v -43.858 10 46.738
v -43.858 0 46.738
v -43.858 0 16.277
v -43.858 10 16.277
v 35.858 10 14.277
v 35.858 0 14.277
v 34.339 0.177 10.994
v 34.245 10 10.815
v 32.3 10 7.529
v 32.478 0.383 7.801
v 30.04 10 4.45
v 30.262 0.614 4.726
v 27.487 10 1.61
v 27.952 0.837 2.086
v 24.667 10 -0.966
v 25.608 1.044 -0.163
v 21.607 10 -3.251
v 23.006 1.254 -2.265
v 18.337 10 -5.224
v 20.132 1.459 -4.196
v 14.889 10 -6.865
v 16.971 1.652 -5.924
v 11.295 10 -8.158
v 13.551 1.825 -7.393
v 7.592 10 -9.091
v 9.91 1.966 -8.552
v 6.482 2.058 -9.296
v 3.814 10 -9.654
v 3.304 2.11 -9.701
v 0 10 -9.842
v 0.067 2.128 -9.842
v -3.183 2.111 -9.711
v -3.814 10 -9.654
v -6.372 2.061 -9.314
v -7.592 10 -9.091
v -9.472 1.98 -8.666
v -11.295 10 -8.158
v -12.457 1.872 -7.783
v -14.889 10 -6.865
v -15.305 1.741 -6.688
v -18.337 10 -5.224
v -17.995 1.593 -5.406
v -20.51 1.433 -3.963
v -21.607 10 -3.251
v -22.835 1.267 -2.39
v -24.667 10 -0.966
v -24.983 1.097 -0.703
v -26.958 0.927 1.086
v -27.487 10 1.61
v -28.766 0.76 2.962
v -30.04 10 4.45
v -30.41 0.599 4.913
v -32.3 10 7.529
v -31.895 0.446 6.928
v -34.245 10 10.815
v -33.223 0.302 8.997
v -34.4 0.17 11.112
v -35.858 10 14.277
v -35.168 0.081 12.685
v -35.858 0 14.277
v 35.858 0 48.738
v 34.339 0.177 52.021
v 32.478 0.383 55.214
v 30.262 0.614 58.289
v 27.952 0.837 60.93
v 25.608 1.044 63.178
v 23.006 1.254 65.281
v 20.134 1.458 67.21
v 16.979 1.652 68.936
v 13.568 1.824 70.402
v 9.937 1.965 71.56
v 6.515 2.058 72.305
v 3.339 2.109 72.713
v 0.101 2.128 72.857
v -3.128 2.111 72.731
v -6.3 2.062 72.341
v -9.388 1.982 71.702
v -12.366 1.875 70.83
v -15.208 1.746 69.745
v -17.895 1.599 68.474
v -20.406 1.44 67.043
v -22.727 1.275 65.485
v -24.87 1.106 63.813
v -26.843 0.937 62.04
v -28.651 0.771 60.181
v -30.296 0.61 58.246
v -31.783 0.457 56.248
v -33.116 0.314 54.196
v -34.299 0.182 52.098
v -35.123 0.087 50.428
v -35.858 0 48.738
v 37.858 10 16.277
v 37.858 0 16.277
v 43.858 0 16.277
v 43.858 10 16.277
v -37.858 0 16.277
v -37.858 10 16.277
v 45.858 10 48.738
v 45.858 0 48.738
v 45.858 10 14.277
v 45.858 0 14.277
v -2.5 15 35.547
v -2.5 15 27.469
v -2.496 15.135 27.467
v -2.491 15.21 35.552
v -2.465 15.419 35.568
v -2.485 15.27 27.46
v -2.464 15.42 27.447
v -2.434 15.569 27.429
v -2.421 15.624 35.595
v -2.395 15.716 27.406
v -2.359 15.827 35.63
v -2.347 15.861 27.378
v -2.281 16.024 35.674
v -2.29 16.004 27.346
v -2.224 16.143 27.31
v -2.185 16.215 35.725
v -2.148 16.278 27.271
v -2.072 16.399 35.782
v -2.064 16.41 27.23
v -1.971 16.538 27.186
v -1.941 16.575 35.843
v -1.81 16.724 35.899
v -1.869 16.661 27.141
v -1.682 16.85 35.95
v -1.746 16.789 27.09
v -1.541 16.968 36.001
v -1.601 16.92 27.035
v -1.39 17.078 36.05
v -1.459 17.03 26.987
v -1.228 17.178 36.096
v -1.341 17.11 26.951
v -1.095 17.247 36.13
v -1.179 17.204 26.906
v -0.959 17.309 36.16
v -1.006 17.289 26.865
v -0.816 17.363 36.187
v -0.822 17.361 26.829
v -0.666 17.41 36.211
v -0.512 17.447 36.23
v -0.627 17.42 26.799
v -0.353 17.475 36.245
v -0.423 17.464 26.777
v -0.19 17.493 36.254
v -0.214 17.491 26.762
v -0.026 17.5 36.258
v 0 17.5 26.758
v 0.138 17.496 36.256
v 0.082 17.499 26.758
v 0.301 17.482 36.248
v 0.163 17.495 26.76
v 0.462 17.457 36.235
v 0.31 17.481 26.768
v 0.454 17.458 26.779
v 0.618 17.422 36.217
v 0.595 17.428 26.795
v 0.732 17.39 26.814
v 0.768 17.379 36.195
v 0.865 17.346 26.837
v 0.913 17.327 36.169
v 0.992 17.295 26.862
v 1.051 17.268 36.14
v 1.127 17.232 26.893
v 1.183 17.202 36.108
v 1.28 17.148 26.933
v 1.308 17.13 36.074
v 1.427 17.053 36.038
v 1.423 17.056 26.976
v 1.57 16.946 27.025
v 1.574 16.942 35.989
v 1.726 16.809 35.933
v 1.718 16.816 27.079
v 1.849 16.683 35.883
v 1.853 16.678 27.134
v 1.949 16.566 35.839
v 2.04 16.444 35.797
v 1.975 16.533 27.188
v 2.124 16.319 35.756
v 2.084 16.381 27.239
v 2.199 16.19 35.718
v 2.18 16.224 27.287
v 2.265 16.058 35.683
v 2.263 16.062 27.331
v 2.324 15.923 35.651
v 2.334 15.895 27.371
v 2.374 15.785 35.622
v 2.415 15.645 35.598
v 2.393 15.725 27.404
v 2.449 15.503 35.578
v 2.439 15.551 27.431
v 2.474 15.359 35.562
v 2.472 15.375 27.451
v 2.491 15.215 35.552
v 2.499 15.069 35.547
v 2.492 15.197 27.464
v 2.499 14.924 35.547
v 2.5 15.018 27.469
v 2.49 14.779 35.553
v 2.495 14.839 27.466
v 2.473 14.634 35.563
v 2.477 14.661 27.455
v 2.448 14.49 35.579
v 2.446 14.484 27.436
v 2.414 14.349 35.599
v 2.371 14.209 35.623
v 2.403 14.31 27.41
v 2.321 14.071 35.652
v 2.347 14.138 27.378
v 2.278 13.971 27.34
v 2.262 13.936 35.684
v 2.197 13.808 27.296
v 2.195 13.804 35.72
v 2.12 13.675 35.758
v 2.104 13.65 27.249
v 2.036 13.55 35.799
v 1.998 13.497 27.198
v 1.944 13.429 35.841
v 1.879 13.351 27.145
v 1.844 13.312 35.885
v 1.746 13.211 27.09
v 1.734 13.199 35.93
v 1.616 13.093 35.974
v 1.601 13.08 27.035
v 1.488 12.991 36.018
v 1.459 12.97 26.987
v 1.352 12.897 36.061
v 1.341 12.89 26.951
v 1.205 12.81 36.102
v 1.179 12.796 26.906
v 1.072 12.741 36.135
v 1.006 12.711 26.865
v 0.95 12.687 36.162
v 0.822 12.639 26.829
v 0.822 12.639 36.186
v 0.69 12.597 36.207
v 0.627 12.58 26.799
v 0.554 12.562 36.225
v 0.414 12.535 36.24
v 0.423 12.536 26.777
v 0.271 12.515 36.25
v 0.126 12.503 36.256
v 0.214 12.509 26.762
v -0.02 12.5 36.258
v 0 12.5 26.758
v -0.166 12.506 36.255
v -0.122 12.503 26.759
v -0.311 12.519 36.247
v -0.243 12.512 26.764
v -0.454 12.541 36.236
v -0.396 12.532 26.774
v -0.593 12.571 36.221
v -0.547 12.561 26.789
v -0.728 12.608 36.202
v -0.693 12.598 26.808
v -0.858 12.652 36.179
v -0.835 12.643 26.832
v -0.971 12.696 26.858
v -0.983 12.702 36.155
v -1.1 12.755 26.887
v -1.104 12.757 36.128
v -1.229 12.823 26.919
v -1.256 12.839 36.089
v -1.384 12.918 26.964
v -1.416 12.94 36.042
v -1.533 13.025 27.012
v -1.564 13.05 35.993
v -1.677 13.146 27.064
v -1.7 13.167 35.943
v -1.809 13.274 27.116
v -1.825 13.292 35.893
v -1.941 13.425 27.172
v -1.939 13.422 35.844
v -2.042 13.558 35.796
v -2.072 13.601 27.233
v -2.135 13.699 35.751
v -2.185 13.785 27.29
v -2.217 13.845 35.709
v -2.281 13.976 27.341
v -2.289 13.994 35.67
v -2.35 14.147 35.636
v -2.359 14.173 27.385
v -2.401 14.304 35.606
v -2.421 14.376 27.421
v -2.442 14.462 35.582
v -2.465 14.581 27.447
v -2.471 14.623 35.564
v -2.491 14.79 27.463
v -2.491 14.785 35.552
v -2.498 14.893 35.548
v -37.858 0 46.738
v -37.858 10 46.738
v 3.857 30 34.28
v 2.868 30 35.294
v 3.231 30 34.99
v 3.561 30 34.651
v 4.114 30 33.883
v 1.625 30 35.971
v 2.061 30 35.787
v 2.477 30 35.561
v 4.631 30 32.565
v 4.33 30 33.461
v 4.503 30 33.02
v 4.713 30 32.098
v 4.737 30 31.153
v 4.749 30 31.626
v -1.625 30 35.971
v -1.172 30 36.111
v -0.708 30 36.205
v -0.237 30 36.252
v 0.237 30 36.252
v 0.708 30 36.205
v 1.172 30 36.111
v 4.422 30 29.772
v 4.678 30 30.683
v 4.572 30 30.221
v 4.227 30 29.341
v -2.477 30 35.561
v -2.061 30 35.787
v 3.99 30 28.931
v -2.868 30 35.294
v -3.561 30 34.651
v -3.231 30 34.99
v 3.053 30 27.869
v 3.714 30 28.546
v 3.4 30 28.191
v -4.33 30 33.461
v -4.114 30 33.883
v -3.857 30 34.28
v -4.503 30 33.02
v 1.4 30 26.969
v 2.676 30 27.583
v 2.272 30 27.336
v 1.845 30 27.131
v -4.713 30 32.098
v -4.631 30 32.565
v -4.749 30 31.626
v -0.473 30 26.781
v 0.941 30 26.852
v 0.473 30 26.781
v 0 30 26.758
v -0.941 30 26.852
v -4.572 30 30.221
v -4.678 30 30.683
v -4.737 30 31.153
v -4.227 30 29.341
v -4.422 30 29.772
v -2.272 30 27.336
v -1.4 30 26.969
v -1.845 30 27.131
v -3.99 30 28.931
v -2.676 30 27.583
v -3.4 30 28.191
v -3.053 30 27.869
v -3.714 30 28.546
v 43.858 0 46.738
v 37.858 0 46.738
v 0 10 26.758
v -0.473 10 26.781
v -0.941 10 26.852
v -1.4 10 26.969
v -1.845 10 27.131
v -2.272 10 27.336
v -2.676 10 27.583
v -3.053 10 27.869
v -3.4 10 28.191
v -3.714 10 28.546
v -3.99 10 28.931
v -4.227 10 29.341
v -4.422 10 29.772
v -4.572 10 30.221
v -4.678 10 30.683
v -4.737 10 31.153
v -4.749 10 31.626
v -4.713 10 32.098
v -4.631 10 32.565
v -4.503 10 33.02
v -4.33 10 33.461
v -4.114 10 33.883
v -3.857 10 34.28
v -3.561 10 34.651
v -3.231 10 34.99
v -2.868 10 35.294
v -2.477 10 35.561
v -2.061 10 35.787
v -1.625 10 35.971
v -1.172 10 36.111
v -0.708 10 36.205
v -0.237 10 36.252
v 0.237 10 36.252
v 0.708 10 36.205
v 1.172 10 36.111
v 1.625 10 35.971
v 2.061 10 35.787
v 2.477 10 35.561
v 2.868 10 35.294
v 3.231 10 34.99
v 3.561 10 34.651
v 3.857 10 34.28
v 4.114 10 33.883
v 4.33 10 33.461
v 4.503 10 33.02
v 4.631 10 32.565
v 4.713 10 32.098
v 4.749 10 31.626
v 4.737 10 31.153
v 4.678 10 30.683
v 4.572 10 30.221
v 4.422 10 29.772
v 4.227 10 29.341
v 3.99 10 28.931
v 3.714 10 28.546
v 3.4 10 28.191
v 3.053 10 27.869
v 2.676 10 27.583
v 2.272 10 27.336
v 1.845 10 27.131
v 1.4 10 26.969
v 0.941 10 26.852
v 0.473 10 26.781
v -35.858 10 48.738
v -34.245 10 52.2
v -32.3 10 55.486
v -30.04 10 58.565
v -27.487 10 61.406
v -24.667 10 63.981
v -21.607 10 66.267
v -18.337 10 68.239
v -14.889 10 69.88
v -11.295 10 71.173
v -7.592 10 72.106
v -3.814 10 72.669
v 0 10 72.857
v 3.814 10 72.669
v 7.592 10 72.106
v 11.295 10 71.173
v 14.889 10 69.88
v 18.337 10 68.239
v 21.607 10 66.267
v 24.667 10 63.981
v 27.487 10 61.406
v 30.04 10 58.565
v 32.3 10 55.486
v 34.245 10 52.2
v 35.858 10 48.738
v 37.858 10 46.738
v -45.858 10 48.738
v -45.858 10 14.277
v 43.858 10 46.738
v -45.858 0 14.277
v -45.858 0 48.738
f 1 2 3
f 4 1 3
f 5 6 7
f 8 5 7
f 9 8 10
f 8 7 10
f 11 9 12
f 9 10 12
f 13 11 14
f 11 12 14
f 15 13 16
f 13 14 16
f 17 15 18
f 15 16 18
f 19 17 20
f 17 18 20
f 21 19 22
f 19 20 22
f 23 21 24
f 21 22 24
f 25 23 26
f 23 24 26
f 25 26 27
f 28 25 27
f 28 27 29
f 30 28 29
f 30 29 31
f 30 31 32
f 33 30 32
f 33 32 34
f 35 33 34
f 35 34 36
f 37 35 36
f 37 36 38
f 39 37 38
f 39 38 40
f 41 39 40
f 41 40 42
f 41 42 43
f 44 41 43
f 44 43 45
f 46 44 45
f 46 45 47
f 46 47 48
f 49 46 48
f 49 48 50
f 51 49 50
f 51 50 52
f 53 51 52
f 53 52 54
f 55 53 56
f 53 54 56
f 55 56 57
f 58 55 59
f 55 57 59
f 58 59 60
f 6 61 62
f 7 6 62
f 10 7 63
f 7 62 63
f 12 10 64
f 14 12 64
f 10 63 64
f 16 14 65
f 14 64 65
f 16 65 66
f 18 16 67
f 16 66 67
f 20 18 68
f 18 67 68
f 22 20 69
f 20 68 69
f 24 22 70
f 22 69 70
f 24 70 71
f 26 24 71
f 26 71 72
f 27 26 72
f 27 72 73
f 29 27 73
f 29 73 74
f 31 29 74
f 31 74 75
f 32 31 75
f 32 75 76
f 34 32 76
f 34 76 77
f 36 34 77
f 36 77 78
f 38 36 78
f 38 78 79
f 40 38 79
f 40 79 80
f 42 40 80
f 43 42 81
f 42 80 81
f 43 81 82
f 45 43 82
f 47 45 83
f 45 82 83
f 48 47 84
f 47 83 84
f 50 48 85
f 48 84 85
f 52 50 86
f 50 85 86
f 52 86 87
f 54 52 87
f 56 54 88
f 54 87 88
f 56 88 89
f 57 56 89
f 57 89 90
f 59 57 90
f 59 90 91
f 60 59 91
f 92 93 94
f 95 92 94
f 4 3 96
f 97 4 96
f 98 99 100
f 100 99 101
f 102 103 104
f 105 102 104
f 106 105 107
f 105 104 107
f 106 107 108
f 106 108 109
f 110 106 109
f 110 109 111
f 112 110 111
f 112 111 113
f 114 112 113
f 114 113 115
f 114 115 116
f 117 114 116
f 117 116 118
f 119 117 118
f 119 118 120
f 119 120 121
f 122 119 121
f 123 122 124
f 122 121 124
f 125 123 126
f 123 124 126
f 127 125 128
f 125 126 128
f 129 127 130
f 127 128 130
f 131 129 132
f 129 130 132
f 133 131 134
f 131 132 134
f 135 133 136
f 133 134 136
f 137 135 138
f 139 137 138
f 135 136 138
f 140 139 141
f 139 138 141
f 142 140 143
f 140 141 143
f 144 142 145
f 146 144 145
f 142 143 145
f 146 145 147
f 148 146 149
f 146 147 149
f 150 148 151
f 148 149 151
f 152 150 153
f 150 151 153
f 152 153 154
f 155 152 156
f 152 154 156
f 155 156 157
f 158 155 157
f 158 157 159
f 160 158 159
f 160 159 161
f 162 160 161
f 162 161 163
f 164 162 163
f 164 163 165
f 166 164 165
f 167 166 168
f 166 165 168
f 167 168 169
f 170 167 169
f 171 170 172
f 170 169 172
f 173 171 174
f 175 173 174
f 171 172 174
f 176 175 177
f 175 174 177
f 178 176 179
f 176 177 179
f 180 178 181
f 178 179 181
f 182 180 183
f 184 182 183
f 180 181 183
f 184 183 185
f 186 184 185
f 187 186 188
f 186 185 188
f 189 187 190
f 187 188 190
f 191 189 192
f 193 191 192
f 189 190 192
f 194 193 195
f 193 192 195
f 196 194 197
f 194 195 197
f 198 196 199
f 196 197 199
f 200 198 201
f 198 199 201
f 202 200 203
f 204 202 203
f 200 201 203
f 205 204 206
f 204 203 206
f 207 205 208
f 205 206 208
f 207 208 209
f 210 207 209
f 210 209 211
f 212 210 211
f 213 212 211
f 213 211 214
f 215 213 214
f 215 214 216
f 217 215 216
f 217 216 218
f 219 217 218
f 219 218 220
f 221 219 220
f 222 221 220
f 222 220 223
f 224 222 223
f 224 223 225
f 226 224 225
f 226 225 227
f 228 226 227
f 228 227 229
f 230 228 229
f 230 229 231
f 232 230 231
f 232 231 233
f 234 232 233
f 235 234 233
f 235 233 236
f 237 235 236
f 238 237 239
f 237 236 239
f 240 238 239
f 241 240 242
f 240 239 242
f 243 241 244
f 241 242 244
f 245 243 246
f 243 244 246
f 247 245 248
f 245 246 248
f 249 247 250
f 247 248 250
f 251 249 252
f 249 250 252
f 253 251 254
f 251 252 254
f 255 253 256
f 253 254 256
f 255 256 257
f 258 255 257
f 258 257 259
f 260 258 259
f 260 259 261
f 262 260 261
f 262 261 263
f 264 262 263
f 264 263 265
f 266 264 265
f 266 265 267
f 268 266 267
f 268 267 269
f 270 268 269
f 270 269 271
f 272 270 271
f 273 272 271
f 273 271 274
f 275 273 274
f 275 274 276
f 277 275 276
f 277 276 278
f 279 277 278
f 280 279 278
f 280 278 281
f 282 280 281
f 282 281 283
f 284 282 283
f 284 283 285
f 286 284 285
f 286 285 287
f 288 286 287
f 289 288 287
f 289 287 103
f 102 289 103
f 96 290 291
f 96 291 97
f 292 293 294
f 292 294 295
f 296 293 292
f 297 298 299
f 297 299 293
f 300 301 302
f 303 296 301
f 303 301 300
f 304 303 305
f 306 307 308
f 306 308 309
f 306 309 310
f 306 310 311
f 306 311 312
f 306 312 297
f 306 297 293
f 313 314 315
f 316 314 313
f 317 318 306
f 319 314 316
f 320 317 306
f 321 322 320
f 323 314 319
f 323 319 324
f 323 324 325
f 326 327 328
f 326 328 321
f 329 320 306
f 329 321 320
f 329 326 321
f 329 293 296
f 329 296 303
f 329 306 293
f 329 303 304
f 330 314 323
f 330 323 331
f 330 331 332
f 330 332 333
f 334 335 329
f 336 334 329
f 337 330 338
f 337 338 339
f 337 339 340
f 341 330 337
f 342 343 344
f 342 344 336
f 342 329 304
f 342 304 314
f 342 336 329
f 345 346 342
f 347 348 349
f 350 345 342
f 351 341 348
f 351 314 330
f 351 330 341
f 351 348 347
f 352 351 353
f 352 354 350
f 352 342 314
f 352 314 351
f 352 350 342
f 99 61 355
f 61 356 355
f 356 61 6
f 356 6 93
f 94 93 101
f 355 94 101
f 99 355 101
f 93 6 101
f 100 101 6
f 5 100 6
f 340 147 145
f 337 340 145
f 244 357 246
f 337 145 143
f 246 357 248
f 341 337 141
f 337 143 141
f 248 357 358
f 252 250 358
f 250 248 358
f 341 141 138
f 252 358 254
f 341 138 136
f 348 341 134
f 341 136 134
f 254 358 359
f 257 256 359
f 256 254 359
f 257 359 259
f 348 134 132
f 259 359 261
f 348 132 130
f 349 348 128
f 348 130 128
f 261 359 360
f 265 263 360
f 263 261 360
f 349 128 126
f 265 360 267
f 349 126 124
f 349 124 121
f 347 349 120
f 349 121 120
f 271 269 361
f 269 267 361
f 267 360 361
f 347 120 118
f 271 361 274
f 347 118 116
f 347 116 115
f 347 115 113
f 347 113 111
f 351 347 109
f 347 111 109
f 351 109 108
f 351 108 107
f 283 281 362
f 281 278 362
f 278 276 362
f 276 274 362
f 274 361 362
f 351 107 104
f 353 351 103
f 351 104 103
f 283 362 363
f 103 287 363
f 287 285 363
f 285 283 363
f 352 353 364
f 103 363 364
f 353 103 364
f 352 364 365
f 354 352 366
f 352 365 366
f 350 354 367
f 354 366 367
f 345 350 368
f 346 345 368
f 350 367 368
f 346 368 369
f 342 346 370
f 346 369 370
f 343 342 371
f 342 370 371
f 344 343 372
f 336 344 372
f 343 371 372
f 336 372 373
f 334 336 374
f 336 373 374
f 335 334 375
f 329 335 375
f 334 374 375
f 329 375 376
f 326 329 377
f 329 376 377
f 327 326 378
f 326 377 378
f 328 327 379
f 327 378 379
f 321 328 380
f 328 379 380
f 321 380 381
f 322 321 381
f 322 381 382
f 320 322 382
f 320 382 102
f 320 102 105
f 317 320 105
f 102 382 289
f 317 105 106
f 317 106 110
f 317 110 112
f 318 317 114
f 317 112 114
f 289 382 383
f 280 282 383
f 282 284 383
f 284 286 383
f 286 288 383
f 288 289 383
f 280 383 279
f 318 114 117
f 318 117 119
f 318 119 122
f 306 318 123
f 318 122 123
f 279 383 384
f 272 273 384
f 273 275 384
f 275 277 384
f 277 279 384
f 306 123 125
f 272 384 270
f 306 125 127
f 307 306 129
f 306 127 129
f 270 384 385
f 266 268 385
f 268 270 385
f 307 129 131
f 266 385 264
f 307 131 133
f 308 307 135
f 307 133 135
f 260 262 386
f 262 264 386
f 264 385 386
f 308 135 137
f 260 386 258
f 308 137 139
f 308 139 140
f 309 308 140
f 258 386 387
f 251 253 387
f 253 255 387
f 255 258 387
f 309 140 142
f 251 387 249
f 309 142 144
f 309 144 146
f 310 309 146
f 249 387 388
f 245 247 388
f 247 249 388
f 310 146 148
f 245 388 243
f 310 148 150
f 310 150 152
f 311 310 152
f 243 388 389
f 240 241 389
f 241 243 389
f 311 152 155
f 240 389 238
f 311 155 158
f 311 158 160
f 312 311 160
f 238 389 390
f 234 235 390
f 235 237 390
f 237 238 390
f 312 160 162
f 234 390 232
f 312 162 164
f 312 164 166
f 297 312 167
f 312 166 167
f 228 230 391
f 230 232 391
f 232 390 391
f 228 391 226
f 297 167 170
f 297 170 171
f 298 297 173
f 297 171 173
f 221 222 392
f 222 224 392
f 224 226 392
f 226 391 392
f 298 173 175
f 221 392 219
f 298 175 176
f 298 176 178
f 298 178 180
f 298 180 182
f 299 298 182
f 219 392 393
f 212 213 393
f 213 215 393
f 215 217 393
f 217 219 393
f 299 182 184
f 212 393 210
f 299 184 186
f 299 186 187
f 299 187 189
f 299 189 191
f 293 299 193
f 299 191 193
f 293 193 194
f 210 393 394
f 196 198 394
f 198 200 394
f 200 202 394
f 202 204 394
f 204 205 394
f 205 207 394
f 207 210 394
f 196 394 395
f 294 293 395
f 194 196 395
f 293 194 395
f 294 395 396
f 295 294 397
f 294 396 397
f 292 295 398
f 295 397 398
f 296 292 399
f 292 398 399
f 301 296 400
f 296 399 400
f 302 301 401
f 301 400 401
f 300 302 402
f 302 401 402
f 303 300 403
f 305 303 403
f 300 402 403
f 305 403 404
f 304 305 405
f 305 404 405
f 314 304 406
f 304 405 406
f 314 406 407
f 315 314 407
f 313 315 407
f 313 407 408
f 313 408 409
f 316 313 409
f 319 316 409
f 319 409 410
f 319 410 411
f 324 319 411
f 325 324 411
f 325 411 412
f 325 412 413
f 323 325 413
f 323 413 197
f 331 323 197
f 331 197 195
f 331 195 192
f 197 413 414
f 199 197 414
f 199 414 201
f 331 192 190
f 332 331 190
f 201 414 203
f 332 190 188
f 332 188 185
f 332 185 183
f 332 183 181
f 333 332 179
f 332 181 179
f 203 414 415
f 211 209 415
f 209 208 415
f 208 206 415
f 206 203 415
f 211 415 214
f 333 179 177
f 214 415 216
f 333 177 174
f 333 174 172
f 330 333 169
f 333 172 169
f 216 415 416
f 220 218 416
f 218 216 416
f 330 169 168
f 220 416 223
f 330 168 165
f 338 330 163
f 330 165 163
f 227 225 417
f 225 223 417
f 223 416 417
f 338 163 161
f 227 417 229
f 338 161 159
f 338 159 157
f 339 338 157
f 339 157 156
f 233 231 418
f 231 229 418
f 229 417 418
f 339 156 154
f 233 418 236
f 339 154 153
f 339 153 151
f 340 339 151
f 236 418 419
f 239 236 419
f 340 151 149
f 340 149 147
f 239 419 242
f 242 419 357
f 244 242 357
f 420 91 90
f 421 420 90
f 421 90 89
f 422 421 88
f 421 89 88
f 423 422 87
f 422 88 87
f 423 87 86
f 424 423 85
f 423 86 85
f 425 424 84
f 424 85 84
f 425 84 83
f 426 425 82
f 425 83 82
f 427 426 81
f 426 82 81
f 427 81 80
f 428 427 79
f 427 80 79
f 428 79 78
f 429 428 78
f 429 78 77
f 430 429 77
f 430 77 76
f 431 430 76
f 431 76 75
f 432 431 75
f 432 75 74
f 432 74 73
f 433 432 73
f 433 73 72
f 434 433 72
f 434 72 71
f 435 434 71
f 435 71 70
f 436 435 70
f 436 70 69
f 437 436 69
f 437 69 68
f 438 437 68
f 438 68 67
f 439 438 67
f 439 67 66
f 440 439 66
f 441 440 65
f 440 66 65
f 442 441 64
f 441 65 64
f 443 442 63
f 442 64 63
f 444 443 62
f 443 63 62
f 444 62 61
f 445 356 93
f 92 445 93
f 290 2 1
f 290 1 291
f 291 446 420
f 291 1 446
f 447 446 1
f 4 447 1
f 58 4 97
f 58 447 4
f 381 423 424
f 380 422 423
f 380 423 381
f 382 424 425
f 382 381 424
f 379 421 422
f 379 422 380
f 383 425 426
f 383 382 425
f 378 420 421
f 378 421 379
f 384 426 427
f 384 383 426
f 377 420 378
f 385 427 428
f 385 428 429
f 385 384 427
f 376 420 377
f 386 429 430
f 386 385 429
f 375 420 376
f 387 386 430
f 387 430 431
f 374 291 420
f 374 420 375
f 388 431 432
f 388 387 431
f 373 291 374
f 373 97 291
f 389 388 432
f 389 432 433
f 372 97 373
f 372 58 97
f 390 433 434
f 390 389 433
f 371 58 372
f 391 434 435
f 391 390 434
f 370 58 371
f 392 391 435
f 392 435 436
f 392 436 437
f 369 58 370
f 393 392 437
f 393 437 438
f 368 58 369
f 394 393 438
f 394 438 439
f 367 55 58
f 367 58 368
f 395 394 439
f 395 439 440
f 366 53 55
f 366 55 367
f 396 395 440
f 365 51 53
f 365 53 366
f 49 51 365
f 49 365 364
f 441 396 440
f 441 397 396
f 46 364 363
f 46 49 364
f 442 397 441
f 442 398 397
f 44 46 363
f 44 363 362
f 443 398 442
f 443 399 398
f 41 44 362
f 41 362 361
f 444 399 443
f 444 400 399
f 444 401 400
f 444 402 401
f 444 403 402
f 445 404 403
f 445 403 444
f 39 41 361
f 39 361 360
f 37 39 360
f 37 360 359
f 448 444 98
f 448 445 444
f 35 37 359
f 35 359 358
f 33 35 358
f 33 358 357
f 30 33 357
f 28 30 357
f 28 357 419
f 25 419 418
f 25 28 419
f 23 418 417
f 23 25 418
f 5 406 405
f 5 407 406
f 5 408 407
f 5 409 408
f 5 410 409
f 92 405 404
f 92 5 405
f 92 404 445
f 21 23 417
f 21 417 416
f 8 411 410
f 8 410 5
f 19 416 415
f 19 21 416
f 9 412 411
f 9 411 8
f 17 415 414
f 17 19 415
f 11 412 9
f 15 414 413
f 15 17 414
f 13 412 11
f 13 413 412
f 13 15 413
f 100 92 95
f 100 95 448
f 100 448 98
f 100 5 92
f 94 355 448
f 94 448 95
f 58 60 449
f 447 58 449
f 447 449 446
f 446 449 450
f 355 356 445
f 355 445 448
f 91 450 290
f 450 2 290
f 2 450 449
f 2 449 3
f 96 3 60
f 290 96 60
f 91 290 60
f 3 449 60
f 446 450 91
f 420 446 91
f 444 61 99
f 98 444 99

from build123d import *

# Parameters (mm, degrees)
SKETCH4_W           = 6
SKETCH4_H           = 30.460968249
BOSS_EXTRUDE3_DEPTH = 10
SKETCH5_R           = 4.75
BOSS_EXTRUDE4_DEPTH = 20
CUT_EXTRUDE1_REACH  = 73.611
SKETCH6_R           = 2.5
CUT_EXTRUDE2_REACH  = 101.208


with BuildPart() as part:
    # Sketch4 → Boss-Extrude3 (new body)
    with BuildSketch(Plane(origin=(0, 0, 0), x_dir=(1, 0, 0), z_dir=(0, 1, 0))):
        with BuildLine():
            Line((35.857927804, -48.738130517), (45.857927804, -48.738130517))
            Line((45.857927804, -48.738130517), (45.857927804, -14.277162268))
            Line((45.857927804, -14.277162268), (35.857927804, -14.277162268))
            ThreePointArc((35.857927804, -14.277162268), (0, 9.842170723), (-35.857927804, -14.277162268))
            Line((-35.857927804, -14.277162268), (-45.857927804, -14.277162268))
            Line((-45.857927804, -14.277162268), (-45.857927804, -48.738130517))
            Line((-45.857927804, -48.738130517), (-35.857927804, -48.738130517))
            ThreePointArc((-35.857927804, -48.738130517), (0, -72.857463508), (35.857927804, -48.738130517))
        make_face()
        with Locations((40.857927804, -31.507646392)):
            Rectangle(SKETCH4_W, SKETCH4_H, mode=Mode.SUBTRACT)
        with Locations((-40.857927804, -31.507646392)):
            Rectangle(SKETCH4_W, SKETCH4_H, mode=Mode.SUBTRACT)
    extrude(amount=BOSS_EXTRUDE3_DEPTH)

    # Sketch5 → Boss-Extrude4 (add)
    with BuildSketch(Plane(origin=(0, 10, 0), x_dir=(1, 0, 0), z_dir=(0, 1, 0))):
        with Locations(Location((0, -31.507646393, 0), (0, 0, 90))):
            Circle(SKETCH5_R)
    extrude(amount=BOSS_EXTRUDE4_DEPTH)

    # Sketch6 → Cut-Extrude1 (cut, up to next)
    with BuildSketch(Plane(origin=(0, 0, 26.757646393), x_dir=(-1, 0, 0), z_dir=(0, 0, -1)), mode=Mode.PRIVATE) as cut_extrude1_sk1:
        with Locations((0, 15)):
            Circle(SKETCH6_R)
    cut_extrude1_tool1 = extrude(cut_extrude1_sk1.sketch, amount=-CUT_EXTRUDE1_REACH, mode=Mode.PRIVATE) & part.part
    add(cut_extrude1_tool1.solids().sort_by_distance((0, 15, 26.757646))[0], mode=Mode.SUBTRACT)

    # Sketch7 → Cut-Extrude2 (cut, up to next)
    with BuildSketch(Plane.XY.offset(72.857463508), mode=Mode.PRIVATE) as cut_extrude2_sk1:
        with BuildLine():
            Line((-35.857927804, 0), (35.857927804, 0))
            ThreePointArc((35.857927804, 0), (0, 2.127613267), (-35.857927804, 0))
        make_face()
    cut_extrude2_tool1 = extrude(cut_extrude2_sk1.sketch, amount=-CUT_EXTRUDE2_REACH, mode=Mode.PRIVATE) & part.part
    add(cut_extrude2_tool1.solids().sort_by_distance((0, 0.851302, 72.857464))[0], mode=Mode.SUBTRACT)


solid = part.part
